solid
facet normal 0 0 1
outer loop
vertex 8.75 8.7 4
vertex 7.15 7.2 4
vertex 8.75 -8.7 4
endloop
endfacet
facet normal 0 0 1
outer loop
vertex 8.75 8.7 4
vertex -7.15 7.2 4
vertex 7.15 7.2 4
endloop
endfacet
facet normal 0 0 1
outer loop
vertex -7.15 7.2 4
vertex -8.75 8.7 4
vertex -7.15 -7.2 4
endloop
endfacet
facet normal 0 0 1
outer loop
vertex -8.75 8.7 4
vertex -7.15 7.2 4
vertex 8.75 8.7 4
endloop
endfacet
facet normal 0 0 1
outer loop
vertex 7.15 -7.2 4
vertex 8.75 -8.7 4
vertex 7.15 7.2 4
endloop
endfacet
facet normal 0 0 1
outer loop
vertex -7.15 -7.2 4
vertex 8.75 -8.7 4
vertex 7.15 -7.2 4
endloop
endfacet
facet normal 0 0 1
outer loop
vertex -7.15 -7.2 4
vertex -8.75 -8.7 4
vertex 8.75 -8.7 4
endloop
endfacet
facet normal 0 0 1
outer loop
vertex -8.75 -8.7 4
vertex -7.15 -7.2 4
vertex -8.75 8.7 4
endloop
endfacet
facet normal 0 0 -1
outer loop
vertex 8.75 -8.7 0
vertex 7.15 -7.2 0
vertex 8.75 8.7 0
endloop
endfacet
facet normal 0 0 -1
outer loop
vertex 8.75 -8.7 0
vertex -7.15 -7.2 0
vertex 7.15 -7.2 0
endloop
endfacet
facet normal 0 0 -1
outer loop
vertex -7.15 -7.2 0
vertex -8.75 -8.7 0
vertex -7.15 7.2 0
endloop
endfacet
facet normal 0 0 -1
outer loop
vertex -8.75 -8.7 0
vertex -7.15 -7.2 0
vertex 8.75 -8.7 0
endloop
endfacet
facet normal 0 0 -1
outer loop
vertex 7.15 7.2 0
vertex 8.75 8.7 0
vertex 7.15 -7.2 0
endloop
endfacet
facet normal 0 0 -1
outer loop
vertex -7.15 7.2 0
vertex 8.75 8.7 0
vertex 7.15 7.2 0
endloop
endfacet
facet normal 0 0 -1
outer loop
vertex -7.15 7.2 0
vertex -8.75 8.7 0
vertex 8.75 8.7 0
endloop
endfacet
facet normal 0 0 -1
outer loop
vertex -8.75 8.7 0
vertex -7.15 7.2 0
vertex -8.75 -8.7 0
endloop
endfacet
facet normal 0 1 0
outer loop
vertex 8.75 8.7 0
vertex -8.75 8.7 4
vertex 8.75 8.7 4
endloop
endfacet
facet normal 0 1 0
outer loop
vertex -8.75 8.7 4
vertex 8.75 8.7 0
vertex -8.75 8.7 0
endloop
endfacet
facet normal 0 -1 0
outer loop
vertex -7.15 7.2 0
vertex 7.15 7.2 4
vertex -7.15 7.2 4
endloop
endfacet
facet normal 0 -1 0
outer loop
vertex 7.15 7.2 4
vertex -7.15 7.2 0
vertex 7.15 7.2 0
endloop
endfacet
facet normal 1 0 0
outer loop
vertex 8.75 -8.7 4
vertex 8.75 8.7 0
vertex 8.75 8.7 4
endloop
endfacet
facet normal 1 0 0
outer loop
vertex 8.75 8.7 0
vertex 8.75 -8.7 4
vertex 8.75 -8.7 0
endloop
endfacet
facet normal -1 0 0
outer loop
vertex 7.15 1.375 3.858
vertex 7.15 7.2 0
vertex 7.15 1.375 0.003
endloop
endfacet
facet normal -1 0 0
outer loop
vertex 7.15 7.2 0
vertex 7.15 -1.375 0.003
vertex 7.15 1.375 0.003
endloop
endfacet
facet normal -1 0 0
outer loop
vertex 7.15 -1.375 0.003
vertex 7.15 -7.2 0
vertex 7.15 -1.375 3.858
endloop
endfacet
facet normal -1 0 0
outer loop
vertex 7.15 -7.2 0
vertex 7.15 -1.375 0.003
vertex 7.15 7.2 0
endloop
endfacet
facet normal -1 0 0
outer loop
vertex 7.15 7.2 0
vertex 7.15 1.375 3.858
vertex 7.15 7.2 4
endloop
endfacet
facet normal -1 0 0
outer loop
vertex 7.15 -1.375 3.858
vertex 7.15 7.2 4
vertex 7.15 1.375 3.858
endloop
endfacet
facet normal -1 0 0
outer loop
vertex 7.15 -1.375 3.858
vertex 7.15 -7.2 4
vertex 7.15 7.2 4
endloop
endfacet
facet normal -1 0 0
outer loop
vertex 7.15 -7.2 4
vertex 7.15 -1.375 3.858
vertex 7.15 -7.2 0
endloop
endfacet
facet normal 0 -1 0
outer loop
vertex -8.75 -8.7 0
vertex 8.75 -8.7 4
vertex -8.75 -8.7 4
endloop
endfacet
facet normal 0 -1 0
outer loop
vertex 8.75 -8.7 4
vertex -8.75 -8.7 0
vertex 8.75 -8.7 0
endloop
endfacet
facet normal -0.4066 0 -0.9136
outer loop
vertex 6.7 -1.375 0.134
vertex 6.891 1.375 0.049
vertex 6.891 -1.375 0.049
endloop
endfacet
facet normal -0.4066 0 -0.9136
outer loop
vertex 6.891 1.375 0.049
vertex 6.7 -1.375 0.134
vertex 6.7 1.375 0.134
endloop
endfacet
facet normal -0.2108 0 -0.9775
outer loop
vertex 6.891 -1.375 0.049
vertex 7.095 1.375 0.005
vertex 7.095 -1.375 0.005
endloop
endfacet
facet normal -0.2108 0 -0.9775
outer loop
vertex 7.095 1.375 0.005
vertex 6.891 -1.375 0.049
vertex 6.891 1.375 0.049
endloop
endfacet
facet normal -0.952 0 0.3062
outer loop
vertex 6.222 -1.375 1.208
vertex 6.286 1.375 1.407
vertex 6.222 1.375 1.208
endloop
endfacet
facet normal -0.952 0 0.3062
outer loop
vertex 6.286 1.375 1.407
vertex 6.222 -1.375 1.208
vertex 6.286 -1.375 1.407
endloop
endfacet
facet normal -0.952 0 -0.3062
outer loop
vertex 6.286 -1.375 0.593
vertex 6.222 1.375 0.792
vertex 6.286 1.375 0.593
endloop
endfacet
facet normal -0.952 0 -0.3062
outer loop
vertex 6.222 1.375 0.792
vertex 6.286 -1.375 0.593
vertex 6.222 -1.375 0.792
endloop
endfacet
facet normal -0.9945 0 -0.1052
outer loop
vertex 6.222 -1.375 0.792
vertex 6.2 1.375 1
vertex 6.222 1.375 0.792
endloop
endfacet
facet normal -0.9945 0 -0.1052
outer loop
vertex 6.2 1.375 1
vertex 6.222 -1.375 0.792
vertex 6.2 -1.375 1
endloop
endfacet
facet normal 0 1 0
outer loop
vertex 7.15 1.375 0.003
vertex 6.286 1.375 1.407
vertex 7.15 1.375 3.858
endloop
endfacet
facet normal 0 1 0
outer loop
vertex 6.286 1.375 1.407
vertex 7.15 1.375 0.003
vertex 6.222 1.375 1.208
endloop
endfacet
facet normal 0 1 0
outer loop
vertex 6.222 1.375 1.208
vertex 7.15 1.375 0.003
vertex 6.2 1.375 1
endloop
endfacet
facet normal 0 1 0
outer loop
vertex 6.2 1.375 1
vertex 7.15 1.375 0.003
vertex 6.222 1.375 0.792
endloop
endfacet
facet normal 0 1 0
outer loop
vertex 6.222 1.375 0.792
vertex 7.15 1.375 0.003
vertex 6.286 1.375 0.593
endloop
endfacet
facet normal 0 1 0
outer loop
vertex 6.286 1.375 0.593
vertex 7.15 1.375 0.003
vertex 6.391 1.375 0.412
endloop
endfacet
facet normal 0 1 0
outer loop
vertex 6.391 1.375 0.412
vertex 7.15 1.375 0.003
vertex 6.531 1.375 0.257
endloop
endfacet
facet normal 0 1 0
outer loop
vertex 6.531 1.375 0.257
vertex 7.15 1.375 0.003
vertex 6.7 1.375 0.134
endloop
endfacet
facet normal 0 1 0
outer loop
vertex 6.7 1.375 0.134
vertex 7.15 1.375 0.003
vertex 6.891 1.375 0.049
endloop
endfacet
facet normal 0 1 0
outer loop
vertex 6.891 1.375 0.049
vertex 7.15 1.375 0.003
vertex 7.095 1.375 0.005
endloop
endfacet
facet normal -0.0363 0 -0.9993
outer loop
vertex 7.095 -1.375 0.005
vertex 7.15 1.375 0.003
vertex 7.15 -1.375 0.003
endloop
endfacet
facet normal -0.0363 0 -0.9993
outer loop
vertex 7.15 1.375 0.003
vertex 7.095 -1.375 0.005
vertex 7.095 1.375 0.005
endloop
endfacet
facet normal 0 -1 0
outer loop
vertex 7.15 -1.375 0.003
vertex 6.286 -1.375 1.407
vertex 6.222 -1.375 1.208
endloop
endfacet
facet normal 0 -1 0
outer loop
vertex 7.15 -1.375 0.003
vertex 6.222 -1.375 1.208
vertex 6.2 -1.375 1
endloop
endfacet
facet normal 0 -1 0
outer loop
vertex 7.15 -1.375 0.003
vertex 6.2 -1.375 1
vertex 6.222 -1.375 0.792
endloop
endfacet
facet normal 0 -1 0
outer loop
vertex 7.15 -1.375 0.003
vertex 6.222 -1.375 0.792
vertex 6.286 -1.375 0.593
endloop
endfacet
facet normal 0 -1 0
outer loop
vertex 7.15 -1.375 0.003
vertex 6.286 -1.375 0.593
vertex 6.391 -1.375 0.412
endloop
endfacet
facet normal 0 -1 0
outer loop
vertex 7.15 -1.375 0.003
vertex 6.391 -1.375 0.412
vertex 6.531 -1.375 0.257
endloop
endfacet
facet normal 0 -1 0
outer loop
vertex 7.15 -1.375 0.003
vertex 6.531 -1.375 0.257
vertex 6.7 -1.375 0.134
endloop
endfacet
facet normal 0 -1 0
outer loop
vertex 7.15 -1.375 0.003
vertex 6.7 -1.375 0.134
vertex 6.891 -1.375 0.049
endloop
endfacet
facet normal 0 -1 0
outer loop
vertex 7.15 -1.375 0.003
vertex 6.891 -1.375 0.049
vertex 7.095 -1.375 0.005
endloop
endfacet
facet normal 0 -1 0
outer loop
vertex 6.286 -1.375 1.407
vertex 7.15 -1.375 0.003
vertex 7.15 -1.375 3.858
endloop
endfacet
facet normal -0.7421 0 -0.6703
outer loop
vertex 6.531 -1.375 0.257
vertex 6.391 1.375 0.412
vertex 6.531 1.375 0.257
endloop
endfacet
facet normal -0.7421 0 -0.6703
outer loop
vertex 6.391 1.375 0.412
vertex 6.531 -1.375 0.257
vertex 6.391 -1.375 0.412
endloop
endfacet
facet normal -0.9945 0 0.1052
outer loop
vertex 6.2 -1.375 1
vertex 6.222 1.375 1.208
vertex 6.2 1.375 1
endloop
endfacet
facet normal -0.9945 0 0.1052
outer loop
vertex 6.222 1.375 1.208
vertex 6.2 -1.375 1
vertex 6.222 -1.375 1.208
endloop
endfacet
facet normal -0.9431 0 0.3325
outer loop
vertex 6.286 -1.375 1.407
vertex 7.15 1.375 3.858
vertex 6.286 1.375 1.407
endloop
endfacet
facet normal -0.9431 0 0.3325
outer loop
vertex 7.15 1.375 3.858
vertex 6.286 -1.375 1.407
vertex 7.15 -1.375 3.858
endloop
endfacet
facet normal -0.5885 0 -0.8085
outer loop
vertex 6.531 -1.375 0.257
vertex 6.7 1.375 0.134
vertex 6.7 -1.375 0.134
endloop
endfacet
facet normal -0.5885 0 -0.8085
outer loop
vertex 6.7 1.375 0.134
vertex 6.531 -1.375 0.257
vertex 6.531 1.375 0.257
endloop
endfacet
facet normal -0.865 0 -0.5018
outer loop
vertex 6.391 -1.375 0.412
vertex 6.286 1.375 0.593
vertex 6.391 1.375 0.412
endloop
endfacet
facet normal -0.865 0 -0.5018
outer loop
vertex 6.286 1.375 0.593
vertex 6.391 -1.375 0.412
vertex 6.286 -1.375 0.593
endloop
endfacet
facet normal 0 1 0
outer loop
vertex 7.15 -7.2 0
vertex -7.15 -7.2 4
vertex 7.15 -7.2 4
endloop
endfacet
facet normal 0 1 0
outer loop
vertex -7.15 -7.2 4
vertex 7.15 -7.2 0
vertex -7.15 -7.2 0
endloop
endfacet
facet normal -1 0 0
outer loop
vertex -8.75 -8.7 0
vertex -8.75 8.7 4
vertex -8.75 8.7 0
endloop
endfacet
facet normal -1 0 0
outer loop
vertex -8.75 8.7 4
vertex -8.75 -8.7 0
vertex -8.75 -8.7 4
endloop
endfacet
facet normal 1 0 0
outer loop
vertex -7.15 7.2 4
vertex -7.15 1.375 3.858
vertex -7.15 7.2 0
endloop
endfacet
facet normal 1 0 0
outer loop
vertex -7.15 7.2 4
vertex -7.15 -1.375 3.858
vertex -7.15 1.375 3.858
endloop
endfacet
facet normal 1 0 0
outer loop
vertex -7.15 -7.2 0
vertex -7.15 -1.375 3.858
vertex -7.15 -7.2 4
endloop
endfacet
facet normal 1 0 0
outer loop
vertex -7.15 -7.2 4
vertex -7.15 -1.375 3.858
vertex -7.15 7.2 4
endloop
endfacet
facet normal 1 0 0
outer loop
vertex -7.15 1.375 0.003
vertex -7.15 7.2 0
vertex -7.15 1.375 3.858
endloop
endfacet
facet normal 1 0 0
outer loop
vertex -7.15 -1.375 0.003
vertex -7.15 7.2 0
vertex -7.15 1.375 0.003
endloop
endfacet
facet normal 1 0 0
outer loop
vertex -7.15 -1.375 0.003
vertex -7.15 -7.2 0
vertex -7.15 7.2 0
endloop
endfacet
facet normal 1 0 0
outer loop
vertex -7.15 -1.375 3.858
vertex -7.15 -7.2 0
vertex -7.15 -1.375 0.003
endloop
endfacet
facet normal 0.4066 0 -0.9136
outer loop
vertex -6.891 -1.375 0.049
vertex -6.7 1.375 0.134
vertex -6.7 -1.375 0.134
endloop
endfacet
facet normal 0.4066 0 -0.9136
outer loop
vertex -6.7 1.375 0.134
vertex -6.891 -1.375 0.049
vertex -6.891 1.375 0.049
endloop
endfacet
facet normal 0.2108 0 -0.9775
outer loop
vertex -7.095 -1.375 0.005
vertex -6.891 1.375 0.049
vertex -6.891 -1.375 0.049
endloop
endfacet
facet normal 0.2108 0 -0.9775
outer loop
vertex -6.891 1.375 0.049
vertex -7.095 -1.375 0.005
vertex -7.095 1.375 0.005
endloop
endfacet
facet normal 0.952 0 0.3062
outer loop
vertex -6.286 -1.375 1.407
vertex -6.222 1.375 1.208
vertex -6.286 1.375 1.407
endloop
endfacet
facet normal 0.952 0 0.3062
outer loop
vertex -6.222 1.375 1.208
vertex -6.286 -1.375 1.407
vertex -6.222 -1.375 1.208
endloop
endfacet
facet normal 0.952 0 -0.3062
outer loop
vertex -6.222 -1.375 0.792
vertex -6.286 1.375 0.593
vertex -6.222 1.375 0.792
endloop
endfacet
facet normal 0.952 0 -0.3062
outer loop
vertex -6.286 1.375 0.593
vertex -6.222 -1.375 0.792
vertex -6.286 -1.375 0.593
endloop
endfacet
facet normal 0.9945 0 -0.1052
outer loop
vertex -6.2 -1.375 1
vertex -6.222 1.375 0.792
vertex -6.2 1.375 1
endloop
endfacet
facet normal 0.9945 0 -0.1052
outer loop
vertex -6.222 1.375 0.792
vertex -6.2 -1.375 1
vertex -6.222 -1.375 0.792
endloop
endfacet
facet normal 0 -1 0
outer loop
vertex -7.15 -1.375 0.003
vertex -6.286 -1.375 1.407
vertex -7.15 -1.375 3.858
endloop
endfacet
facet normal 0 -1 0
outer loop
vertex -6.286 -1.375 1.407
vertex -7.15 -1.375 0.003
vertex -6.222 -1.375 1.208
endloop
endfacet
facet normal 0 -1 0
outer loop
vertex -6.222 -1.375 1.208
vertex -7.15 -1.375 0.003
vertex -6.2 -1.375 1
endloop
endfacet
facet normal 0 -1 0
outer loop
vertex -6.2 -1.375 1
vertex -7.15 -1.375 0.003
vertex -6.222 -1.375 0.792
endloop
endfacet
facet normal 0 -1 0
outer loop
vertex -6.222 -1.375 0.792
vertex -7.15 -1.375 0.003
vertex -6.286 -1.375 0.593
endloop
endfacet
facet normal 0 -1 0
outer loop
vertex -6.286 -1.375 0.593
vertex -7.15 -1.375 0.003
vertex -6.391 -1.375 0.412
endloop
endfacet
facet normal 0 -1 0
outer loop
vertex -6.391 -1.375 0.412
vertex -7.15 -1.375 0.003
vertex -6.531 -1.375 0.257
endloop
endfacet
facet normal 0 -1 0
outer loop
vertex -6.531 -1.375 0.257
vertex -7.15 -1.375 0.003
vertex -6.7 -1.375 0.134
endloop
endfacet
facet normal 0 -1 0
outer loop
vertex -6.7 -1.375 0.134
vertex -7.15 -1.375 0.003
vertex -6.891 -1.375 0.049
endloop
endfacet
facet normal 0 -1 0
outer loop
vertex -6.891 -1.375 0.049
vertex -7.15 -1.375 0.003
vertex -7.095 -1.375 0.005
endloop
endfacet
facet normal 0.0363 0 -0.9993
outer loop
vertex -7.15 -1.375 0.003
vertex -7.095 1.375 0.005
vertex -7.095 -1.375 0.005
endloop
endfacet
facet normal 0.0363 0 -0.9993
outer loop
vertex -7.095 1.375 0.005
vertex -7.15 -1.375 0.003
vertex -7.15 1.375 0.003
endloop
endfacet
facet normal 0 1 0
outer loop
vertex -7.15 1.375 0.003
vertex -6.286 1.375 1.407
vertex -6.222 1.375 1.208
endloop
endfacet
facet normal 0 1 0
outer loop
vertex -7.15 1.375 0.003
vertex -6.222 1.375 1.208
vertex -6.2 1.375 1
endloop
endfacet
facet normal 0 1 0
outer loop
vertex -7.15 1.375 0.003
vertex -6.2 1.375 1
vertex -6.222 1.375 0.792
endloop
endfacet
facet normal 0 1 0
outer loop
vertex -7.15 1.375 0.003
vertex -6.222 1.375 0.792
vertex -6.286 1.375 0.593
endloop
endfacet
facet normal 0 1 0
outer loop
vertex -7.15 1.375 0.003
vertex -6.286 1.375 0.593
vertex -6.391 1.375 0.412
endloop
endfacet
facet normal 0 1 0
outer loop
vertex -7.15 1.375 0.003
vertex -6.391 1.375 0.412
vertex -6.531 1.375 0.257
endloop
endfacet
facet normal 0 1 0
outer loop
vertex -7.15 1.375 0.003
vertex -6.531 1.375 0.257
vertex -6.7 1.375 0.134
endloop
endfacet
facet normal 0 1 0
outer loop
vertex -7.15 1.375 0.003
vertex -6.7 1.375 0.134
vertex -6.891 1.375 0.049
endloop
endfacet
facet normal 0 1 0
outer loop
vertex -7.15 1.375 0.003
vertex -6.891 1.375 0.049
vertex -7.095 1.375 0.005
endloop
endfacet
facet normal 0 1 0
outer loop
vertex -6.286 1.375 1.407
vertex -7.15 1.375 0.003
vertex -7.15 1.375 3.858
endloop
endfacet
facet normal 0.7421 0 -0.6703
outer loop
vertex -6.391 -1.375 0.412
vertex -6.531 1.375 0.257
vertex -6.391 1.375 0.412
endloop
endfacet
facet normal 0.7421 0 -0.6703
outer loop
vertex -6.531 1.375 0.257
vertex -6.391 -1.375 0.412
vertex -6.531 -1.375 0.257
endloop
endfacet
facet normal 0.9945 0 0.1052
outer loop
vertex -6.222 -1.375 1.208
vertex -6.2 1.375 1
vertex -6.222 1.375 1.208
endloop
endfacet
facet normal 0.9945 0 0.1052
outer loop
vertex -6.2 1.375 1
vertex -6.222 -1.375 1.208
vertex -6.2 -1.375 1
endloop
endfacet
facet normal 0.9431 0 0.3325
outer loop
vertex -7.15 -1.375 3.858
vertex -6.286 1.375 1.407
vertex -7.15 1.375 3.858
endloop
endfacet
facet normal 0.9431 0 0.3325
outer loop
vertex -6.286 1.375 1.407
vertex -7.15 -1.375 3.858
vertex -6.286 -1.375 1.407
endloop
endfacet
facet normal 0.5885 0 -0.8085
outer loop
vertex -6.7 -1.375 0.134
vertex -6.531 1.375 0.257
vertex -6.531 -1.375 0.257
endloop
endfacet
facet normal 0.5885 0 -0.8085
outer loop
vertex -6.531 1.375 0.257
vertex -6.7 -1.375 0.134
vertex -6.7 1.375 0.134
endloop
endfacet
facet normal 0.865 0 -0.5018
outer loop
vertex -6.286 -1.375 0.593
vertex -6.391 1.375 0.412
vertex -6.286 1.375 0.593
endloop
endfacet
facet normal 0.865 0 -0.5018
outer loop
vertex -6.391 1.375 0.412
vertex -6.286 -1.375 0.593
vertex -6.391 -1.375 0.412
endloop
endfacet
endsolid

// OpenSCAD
union () {
  union () {
    translate ([0, 7.95, 2]) {
      cube ([17.4, 1.5, 4], center=true);
    }
    translate ([7.95, 0, 2]) {
      cube ([1.6, 17.4, 4], center=true);
    }
    hull () {
      translate ([7.95, 0, 2]) {
        cube ([1.5, 2.75, 4], center=true);
      }
      translate ([7.2, 0, 1]) {
        rotate (a=90.0, v=[1, 0, 0]) {
          cylinder ($fn=30, h=2.75, r=1, center=true);
        }
      }
    }
  }
  mirror ([0, 1, 0]) {
    mirror ([1, 0, 0]) {
      union () {
        translate ([0, 7.95, 2]) {
          cube ([17.4, 1.5, 4], center=true);
        }
        translate ([7.95, 0, 2]) {
          cube ([1.6, 17.4, 4], center=true);
        }
        hull () {
          translate ([7.95, 0, 2]) {
            cube ([1.5, 2.75, 4], center=true);
          }
          translate ([7.2, 0, 1]) {
            rotate (a=90.0, v=[1, 0, 0]) {
              cylinder ($fn=30, h=2.75, r=1, center=true);
            }
          }
        }
      }
    }
  }
}
